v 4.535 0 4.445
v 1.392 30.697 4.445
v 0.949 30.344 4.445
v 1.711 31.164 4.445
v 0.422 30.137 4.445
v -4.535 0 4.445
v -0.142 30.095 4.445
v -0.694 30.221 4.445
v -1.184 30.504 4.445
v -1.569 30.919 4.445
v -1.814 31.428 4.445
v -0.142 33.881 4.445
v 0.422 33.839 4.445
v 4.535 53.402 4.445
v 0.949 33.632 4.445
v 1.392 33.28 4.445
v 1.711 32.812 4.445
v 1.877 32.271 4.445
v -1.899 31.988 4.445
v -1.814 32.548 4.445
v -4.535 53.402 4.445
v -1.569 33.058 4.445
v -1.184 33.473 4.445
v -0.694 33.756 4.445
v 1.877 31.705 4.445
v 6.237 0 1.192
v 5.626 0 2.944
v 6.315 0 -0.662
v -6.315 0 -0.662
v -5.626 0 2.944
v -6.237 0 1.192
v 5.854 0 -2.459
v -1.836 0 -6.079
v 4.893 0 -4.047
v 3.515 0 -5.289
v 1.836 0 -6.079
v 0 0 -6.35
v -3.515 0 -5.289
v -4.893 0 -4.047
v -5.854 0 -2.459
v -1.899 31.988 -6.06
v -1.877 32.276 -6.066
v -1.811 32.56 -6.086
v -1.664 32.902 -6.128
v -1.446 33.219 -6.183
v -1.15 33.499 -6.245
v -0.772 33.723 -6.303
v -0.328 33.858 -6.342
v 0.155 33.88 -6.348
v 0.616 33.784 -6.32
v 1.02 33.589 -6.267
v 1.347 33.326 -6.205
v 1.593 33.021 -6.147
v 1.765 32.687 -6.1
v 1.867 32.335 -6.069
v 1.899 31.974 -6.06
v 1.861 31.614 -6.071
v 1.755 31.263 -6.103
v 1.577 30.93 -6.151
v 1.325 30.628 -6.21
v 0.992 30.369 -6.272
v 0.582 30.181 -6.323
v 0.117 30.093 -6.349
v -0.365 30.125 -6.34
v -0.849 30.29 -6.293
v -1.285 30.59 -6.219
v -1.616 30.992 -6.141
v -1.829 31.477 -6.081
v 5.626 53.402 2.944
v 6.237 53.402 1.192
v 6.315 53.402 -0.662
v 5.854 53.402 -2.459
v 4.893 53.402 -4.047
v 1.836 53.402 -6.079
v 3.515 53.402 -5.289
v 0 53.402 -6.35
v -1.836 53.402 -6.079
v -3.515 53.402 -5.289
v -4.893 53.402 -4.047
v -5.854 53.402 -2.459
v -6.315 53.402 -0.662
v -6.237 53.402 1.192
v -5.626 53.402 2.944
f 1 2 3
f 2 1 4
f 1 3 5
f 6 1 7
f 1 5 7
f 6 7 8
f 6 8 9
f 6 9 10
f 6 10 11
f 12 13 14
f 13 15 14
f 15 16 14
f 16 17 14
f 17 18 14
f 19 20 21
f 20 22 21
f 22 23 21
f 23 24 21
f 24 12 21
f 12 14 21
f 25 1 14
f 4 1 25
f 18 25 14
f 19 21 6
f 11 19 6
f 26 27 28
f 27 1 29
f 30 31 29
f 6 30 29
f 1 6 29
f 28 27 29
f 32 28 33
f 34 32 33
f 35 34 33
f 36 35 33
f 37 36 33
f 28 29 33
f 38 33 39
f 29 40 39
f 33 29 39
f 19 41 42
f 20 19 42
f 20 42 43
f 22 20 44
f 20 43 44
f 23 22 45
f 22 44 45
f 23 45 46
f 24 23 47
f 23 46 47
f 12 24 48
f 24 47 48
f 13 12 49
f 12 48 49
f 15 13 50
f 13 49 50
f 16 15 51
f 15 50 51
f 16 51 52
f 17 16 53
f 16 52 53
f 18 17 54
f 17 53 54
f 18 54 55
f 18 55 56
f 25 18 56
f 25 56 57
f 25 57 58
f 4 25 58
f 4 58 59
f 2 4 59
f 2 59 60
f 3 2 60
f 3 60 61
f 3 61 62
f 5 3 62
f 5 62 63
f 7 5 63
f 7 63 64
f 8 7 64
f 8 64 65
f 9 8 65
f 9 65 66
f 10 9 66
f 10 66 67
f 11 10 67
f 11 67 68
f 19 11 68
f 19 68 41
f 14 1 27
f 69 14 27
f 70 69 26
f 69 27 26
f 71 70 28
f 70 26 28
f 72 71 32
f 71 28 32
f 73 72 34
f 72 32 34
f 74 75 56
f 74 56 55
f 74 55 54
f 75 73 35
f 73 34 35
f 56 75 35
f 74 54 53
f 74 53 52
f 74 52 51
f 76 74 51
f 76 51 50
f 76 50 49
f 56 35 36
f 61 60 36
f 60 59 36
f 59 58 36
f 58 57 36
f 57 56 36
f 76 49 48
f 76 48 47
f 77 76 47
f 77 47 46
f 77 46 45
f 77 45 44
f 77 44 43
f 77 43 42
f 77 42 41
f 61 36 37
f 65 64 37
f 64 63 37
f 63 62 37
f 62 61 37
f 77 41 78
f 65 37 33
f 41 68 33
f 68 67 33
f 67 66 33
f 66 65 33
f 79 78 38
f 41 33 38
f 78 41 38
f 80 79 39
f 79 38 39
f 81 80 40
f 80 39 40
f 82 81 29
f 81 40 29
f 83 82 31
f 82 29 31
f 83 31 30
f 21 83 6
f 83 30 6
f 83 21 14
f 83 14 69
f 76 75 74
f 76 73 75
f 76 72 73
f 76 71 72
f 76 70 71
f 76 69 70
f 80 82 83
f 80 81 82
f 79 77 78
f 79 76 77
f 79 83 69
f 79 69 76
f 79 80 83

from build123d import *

# Parameters (mm, degrees)
SKETCH1_R              = 6.35
BOSS_EXTRUDE1_DEPTH    = 53.401902472
CUT_EXTRUDE1_DEPTH     = 55.15171454
F_10_24_TAPPED_HOLE1_D = 3.7973


with BuildPart() as part:
    # Sketch1 → Boss-Extrude1 (new body)
    with BuildSketch(Plane(origin=(0, 0, 0), x_dir=(1, 0, 0), z_dir=(0, 1, 0))):
        with Locations(Location((0, 0, 0), (0, 0, 90))):
            Circle(SKETCH1_R)
    extrude(amount=BOSS_EXTRUDE1_DEPTH)

    # Sketch2 → Cut-Extrude1 (cut, through all)
    with BuildSketch(Plane(origin=(0, 53.401902472, 0), x_dir=(1, 0, 0), z_dir=(0, 1, 0))):
        Polygon((0, -4.445), (-5.65519603, -4.445), (-5.65519603, -6.850474894), (5.907942222, -6.850474894), (5.907942222, -4.445), align=None)
    extrude(amount=-CUT_EXTRUDE1_DEPTH, mode=Mode.SUBTRACT)

    # #10-24 Tapped Hole1 (through all)
    with Locations(Plane.XY.offset(4.445)):
        with Locations((0, 31.988125)):
            Hole(F_10_24_TAPPED_HOLE1_D / 2)


solid = part.part
